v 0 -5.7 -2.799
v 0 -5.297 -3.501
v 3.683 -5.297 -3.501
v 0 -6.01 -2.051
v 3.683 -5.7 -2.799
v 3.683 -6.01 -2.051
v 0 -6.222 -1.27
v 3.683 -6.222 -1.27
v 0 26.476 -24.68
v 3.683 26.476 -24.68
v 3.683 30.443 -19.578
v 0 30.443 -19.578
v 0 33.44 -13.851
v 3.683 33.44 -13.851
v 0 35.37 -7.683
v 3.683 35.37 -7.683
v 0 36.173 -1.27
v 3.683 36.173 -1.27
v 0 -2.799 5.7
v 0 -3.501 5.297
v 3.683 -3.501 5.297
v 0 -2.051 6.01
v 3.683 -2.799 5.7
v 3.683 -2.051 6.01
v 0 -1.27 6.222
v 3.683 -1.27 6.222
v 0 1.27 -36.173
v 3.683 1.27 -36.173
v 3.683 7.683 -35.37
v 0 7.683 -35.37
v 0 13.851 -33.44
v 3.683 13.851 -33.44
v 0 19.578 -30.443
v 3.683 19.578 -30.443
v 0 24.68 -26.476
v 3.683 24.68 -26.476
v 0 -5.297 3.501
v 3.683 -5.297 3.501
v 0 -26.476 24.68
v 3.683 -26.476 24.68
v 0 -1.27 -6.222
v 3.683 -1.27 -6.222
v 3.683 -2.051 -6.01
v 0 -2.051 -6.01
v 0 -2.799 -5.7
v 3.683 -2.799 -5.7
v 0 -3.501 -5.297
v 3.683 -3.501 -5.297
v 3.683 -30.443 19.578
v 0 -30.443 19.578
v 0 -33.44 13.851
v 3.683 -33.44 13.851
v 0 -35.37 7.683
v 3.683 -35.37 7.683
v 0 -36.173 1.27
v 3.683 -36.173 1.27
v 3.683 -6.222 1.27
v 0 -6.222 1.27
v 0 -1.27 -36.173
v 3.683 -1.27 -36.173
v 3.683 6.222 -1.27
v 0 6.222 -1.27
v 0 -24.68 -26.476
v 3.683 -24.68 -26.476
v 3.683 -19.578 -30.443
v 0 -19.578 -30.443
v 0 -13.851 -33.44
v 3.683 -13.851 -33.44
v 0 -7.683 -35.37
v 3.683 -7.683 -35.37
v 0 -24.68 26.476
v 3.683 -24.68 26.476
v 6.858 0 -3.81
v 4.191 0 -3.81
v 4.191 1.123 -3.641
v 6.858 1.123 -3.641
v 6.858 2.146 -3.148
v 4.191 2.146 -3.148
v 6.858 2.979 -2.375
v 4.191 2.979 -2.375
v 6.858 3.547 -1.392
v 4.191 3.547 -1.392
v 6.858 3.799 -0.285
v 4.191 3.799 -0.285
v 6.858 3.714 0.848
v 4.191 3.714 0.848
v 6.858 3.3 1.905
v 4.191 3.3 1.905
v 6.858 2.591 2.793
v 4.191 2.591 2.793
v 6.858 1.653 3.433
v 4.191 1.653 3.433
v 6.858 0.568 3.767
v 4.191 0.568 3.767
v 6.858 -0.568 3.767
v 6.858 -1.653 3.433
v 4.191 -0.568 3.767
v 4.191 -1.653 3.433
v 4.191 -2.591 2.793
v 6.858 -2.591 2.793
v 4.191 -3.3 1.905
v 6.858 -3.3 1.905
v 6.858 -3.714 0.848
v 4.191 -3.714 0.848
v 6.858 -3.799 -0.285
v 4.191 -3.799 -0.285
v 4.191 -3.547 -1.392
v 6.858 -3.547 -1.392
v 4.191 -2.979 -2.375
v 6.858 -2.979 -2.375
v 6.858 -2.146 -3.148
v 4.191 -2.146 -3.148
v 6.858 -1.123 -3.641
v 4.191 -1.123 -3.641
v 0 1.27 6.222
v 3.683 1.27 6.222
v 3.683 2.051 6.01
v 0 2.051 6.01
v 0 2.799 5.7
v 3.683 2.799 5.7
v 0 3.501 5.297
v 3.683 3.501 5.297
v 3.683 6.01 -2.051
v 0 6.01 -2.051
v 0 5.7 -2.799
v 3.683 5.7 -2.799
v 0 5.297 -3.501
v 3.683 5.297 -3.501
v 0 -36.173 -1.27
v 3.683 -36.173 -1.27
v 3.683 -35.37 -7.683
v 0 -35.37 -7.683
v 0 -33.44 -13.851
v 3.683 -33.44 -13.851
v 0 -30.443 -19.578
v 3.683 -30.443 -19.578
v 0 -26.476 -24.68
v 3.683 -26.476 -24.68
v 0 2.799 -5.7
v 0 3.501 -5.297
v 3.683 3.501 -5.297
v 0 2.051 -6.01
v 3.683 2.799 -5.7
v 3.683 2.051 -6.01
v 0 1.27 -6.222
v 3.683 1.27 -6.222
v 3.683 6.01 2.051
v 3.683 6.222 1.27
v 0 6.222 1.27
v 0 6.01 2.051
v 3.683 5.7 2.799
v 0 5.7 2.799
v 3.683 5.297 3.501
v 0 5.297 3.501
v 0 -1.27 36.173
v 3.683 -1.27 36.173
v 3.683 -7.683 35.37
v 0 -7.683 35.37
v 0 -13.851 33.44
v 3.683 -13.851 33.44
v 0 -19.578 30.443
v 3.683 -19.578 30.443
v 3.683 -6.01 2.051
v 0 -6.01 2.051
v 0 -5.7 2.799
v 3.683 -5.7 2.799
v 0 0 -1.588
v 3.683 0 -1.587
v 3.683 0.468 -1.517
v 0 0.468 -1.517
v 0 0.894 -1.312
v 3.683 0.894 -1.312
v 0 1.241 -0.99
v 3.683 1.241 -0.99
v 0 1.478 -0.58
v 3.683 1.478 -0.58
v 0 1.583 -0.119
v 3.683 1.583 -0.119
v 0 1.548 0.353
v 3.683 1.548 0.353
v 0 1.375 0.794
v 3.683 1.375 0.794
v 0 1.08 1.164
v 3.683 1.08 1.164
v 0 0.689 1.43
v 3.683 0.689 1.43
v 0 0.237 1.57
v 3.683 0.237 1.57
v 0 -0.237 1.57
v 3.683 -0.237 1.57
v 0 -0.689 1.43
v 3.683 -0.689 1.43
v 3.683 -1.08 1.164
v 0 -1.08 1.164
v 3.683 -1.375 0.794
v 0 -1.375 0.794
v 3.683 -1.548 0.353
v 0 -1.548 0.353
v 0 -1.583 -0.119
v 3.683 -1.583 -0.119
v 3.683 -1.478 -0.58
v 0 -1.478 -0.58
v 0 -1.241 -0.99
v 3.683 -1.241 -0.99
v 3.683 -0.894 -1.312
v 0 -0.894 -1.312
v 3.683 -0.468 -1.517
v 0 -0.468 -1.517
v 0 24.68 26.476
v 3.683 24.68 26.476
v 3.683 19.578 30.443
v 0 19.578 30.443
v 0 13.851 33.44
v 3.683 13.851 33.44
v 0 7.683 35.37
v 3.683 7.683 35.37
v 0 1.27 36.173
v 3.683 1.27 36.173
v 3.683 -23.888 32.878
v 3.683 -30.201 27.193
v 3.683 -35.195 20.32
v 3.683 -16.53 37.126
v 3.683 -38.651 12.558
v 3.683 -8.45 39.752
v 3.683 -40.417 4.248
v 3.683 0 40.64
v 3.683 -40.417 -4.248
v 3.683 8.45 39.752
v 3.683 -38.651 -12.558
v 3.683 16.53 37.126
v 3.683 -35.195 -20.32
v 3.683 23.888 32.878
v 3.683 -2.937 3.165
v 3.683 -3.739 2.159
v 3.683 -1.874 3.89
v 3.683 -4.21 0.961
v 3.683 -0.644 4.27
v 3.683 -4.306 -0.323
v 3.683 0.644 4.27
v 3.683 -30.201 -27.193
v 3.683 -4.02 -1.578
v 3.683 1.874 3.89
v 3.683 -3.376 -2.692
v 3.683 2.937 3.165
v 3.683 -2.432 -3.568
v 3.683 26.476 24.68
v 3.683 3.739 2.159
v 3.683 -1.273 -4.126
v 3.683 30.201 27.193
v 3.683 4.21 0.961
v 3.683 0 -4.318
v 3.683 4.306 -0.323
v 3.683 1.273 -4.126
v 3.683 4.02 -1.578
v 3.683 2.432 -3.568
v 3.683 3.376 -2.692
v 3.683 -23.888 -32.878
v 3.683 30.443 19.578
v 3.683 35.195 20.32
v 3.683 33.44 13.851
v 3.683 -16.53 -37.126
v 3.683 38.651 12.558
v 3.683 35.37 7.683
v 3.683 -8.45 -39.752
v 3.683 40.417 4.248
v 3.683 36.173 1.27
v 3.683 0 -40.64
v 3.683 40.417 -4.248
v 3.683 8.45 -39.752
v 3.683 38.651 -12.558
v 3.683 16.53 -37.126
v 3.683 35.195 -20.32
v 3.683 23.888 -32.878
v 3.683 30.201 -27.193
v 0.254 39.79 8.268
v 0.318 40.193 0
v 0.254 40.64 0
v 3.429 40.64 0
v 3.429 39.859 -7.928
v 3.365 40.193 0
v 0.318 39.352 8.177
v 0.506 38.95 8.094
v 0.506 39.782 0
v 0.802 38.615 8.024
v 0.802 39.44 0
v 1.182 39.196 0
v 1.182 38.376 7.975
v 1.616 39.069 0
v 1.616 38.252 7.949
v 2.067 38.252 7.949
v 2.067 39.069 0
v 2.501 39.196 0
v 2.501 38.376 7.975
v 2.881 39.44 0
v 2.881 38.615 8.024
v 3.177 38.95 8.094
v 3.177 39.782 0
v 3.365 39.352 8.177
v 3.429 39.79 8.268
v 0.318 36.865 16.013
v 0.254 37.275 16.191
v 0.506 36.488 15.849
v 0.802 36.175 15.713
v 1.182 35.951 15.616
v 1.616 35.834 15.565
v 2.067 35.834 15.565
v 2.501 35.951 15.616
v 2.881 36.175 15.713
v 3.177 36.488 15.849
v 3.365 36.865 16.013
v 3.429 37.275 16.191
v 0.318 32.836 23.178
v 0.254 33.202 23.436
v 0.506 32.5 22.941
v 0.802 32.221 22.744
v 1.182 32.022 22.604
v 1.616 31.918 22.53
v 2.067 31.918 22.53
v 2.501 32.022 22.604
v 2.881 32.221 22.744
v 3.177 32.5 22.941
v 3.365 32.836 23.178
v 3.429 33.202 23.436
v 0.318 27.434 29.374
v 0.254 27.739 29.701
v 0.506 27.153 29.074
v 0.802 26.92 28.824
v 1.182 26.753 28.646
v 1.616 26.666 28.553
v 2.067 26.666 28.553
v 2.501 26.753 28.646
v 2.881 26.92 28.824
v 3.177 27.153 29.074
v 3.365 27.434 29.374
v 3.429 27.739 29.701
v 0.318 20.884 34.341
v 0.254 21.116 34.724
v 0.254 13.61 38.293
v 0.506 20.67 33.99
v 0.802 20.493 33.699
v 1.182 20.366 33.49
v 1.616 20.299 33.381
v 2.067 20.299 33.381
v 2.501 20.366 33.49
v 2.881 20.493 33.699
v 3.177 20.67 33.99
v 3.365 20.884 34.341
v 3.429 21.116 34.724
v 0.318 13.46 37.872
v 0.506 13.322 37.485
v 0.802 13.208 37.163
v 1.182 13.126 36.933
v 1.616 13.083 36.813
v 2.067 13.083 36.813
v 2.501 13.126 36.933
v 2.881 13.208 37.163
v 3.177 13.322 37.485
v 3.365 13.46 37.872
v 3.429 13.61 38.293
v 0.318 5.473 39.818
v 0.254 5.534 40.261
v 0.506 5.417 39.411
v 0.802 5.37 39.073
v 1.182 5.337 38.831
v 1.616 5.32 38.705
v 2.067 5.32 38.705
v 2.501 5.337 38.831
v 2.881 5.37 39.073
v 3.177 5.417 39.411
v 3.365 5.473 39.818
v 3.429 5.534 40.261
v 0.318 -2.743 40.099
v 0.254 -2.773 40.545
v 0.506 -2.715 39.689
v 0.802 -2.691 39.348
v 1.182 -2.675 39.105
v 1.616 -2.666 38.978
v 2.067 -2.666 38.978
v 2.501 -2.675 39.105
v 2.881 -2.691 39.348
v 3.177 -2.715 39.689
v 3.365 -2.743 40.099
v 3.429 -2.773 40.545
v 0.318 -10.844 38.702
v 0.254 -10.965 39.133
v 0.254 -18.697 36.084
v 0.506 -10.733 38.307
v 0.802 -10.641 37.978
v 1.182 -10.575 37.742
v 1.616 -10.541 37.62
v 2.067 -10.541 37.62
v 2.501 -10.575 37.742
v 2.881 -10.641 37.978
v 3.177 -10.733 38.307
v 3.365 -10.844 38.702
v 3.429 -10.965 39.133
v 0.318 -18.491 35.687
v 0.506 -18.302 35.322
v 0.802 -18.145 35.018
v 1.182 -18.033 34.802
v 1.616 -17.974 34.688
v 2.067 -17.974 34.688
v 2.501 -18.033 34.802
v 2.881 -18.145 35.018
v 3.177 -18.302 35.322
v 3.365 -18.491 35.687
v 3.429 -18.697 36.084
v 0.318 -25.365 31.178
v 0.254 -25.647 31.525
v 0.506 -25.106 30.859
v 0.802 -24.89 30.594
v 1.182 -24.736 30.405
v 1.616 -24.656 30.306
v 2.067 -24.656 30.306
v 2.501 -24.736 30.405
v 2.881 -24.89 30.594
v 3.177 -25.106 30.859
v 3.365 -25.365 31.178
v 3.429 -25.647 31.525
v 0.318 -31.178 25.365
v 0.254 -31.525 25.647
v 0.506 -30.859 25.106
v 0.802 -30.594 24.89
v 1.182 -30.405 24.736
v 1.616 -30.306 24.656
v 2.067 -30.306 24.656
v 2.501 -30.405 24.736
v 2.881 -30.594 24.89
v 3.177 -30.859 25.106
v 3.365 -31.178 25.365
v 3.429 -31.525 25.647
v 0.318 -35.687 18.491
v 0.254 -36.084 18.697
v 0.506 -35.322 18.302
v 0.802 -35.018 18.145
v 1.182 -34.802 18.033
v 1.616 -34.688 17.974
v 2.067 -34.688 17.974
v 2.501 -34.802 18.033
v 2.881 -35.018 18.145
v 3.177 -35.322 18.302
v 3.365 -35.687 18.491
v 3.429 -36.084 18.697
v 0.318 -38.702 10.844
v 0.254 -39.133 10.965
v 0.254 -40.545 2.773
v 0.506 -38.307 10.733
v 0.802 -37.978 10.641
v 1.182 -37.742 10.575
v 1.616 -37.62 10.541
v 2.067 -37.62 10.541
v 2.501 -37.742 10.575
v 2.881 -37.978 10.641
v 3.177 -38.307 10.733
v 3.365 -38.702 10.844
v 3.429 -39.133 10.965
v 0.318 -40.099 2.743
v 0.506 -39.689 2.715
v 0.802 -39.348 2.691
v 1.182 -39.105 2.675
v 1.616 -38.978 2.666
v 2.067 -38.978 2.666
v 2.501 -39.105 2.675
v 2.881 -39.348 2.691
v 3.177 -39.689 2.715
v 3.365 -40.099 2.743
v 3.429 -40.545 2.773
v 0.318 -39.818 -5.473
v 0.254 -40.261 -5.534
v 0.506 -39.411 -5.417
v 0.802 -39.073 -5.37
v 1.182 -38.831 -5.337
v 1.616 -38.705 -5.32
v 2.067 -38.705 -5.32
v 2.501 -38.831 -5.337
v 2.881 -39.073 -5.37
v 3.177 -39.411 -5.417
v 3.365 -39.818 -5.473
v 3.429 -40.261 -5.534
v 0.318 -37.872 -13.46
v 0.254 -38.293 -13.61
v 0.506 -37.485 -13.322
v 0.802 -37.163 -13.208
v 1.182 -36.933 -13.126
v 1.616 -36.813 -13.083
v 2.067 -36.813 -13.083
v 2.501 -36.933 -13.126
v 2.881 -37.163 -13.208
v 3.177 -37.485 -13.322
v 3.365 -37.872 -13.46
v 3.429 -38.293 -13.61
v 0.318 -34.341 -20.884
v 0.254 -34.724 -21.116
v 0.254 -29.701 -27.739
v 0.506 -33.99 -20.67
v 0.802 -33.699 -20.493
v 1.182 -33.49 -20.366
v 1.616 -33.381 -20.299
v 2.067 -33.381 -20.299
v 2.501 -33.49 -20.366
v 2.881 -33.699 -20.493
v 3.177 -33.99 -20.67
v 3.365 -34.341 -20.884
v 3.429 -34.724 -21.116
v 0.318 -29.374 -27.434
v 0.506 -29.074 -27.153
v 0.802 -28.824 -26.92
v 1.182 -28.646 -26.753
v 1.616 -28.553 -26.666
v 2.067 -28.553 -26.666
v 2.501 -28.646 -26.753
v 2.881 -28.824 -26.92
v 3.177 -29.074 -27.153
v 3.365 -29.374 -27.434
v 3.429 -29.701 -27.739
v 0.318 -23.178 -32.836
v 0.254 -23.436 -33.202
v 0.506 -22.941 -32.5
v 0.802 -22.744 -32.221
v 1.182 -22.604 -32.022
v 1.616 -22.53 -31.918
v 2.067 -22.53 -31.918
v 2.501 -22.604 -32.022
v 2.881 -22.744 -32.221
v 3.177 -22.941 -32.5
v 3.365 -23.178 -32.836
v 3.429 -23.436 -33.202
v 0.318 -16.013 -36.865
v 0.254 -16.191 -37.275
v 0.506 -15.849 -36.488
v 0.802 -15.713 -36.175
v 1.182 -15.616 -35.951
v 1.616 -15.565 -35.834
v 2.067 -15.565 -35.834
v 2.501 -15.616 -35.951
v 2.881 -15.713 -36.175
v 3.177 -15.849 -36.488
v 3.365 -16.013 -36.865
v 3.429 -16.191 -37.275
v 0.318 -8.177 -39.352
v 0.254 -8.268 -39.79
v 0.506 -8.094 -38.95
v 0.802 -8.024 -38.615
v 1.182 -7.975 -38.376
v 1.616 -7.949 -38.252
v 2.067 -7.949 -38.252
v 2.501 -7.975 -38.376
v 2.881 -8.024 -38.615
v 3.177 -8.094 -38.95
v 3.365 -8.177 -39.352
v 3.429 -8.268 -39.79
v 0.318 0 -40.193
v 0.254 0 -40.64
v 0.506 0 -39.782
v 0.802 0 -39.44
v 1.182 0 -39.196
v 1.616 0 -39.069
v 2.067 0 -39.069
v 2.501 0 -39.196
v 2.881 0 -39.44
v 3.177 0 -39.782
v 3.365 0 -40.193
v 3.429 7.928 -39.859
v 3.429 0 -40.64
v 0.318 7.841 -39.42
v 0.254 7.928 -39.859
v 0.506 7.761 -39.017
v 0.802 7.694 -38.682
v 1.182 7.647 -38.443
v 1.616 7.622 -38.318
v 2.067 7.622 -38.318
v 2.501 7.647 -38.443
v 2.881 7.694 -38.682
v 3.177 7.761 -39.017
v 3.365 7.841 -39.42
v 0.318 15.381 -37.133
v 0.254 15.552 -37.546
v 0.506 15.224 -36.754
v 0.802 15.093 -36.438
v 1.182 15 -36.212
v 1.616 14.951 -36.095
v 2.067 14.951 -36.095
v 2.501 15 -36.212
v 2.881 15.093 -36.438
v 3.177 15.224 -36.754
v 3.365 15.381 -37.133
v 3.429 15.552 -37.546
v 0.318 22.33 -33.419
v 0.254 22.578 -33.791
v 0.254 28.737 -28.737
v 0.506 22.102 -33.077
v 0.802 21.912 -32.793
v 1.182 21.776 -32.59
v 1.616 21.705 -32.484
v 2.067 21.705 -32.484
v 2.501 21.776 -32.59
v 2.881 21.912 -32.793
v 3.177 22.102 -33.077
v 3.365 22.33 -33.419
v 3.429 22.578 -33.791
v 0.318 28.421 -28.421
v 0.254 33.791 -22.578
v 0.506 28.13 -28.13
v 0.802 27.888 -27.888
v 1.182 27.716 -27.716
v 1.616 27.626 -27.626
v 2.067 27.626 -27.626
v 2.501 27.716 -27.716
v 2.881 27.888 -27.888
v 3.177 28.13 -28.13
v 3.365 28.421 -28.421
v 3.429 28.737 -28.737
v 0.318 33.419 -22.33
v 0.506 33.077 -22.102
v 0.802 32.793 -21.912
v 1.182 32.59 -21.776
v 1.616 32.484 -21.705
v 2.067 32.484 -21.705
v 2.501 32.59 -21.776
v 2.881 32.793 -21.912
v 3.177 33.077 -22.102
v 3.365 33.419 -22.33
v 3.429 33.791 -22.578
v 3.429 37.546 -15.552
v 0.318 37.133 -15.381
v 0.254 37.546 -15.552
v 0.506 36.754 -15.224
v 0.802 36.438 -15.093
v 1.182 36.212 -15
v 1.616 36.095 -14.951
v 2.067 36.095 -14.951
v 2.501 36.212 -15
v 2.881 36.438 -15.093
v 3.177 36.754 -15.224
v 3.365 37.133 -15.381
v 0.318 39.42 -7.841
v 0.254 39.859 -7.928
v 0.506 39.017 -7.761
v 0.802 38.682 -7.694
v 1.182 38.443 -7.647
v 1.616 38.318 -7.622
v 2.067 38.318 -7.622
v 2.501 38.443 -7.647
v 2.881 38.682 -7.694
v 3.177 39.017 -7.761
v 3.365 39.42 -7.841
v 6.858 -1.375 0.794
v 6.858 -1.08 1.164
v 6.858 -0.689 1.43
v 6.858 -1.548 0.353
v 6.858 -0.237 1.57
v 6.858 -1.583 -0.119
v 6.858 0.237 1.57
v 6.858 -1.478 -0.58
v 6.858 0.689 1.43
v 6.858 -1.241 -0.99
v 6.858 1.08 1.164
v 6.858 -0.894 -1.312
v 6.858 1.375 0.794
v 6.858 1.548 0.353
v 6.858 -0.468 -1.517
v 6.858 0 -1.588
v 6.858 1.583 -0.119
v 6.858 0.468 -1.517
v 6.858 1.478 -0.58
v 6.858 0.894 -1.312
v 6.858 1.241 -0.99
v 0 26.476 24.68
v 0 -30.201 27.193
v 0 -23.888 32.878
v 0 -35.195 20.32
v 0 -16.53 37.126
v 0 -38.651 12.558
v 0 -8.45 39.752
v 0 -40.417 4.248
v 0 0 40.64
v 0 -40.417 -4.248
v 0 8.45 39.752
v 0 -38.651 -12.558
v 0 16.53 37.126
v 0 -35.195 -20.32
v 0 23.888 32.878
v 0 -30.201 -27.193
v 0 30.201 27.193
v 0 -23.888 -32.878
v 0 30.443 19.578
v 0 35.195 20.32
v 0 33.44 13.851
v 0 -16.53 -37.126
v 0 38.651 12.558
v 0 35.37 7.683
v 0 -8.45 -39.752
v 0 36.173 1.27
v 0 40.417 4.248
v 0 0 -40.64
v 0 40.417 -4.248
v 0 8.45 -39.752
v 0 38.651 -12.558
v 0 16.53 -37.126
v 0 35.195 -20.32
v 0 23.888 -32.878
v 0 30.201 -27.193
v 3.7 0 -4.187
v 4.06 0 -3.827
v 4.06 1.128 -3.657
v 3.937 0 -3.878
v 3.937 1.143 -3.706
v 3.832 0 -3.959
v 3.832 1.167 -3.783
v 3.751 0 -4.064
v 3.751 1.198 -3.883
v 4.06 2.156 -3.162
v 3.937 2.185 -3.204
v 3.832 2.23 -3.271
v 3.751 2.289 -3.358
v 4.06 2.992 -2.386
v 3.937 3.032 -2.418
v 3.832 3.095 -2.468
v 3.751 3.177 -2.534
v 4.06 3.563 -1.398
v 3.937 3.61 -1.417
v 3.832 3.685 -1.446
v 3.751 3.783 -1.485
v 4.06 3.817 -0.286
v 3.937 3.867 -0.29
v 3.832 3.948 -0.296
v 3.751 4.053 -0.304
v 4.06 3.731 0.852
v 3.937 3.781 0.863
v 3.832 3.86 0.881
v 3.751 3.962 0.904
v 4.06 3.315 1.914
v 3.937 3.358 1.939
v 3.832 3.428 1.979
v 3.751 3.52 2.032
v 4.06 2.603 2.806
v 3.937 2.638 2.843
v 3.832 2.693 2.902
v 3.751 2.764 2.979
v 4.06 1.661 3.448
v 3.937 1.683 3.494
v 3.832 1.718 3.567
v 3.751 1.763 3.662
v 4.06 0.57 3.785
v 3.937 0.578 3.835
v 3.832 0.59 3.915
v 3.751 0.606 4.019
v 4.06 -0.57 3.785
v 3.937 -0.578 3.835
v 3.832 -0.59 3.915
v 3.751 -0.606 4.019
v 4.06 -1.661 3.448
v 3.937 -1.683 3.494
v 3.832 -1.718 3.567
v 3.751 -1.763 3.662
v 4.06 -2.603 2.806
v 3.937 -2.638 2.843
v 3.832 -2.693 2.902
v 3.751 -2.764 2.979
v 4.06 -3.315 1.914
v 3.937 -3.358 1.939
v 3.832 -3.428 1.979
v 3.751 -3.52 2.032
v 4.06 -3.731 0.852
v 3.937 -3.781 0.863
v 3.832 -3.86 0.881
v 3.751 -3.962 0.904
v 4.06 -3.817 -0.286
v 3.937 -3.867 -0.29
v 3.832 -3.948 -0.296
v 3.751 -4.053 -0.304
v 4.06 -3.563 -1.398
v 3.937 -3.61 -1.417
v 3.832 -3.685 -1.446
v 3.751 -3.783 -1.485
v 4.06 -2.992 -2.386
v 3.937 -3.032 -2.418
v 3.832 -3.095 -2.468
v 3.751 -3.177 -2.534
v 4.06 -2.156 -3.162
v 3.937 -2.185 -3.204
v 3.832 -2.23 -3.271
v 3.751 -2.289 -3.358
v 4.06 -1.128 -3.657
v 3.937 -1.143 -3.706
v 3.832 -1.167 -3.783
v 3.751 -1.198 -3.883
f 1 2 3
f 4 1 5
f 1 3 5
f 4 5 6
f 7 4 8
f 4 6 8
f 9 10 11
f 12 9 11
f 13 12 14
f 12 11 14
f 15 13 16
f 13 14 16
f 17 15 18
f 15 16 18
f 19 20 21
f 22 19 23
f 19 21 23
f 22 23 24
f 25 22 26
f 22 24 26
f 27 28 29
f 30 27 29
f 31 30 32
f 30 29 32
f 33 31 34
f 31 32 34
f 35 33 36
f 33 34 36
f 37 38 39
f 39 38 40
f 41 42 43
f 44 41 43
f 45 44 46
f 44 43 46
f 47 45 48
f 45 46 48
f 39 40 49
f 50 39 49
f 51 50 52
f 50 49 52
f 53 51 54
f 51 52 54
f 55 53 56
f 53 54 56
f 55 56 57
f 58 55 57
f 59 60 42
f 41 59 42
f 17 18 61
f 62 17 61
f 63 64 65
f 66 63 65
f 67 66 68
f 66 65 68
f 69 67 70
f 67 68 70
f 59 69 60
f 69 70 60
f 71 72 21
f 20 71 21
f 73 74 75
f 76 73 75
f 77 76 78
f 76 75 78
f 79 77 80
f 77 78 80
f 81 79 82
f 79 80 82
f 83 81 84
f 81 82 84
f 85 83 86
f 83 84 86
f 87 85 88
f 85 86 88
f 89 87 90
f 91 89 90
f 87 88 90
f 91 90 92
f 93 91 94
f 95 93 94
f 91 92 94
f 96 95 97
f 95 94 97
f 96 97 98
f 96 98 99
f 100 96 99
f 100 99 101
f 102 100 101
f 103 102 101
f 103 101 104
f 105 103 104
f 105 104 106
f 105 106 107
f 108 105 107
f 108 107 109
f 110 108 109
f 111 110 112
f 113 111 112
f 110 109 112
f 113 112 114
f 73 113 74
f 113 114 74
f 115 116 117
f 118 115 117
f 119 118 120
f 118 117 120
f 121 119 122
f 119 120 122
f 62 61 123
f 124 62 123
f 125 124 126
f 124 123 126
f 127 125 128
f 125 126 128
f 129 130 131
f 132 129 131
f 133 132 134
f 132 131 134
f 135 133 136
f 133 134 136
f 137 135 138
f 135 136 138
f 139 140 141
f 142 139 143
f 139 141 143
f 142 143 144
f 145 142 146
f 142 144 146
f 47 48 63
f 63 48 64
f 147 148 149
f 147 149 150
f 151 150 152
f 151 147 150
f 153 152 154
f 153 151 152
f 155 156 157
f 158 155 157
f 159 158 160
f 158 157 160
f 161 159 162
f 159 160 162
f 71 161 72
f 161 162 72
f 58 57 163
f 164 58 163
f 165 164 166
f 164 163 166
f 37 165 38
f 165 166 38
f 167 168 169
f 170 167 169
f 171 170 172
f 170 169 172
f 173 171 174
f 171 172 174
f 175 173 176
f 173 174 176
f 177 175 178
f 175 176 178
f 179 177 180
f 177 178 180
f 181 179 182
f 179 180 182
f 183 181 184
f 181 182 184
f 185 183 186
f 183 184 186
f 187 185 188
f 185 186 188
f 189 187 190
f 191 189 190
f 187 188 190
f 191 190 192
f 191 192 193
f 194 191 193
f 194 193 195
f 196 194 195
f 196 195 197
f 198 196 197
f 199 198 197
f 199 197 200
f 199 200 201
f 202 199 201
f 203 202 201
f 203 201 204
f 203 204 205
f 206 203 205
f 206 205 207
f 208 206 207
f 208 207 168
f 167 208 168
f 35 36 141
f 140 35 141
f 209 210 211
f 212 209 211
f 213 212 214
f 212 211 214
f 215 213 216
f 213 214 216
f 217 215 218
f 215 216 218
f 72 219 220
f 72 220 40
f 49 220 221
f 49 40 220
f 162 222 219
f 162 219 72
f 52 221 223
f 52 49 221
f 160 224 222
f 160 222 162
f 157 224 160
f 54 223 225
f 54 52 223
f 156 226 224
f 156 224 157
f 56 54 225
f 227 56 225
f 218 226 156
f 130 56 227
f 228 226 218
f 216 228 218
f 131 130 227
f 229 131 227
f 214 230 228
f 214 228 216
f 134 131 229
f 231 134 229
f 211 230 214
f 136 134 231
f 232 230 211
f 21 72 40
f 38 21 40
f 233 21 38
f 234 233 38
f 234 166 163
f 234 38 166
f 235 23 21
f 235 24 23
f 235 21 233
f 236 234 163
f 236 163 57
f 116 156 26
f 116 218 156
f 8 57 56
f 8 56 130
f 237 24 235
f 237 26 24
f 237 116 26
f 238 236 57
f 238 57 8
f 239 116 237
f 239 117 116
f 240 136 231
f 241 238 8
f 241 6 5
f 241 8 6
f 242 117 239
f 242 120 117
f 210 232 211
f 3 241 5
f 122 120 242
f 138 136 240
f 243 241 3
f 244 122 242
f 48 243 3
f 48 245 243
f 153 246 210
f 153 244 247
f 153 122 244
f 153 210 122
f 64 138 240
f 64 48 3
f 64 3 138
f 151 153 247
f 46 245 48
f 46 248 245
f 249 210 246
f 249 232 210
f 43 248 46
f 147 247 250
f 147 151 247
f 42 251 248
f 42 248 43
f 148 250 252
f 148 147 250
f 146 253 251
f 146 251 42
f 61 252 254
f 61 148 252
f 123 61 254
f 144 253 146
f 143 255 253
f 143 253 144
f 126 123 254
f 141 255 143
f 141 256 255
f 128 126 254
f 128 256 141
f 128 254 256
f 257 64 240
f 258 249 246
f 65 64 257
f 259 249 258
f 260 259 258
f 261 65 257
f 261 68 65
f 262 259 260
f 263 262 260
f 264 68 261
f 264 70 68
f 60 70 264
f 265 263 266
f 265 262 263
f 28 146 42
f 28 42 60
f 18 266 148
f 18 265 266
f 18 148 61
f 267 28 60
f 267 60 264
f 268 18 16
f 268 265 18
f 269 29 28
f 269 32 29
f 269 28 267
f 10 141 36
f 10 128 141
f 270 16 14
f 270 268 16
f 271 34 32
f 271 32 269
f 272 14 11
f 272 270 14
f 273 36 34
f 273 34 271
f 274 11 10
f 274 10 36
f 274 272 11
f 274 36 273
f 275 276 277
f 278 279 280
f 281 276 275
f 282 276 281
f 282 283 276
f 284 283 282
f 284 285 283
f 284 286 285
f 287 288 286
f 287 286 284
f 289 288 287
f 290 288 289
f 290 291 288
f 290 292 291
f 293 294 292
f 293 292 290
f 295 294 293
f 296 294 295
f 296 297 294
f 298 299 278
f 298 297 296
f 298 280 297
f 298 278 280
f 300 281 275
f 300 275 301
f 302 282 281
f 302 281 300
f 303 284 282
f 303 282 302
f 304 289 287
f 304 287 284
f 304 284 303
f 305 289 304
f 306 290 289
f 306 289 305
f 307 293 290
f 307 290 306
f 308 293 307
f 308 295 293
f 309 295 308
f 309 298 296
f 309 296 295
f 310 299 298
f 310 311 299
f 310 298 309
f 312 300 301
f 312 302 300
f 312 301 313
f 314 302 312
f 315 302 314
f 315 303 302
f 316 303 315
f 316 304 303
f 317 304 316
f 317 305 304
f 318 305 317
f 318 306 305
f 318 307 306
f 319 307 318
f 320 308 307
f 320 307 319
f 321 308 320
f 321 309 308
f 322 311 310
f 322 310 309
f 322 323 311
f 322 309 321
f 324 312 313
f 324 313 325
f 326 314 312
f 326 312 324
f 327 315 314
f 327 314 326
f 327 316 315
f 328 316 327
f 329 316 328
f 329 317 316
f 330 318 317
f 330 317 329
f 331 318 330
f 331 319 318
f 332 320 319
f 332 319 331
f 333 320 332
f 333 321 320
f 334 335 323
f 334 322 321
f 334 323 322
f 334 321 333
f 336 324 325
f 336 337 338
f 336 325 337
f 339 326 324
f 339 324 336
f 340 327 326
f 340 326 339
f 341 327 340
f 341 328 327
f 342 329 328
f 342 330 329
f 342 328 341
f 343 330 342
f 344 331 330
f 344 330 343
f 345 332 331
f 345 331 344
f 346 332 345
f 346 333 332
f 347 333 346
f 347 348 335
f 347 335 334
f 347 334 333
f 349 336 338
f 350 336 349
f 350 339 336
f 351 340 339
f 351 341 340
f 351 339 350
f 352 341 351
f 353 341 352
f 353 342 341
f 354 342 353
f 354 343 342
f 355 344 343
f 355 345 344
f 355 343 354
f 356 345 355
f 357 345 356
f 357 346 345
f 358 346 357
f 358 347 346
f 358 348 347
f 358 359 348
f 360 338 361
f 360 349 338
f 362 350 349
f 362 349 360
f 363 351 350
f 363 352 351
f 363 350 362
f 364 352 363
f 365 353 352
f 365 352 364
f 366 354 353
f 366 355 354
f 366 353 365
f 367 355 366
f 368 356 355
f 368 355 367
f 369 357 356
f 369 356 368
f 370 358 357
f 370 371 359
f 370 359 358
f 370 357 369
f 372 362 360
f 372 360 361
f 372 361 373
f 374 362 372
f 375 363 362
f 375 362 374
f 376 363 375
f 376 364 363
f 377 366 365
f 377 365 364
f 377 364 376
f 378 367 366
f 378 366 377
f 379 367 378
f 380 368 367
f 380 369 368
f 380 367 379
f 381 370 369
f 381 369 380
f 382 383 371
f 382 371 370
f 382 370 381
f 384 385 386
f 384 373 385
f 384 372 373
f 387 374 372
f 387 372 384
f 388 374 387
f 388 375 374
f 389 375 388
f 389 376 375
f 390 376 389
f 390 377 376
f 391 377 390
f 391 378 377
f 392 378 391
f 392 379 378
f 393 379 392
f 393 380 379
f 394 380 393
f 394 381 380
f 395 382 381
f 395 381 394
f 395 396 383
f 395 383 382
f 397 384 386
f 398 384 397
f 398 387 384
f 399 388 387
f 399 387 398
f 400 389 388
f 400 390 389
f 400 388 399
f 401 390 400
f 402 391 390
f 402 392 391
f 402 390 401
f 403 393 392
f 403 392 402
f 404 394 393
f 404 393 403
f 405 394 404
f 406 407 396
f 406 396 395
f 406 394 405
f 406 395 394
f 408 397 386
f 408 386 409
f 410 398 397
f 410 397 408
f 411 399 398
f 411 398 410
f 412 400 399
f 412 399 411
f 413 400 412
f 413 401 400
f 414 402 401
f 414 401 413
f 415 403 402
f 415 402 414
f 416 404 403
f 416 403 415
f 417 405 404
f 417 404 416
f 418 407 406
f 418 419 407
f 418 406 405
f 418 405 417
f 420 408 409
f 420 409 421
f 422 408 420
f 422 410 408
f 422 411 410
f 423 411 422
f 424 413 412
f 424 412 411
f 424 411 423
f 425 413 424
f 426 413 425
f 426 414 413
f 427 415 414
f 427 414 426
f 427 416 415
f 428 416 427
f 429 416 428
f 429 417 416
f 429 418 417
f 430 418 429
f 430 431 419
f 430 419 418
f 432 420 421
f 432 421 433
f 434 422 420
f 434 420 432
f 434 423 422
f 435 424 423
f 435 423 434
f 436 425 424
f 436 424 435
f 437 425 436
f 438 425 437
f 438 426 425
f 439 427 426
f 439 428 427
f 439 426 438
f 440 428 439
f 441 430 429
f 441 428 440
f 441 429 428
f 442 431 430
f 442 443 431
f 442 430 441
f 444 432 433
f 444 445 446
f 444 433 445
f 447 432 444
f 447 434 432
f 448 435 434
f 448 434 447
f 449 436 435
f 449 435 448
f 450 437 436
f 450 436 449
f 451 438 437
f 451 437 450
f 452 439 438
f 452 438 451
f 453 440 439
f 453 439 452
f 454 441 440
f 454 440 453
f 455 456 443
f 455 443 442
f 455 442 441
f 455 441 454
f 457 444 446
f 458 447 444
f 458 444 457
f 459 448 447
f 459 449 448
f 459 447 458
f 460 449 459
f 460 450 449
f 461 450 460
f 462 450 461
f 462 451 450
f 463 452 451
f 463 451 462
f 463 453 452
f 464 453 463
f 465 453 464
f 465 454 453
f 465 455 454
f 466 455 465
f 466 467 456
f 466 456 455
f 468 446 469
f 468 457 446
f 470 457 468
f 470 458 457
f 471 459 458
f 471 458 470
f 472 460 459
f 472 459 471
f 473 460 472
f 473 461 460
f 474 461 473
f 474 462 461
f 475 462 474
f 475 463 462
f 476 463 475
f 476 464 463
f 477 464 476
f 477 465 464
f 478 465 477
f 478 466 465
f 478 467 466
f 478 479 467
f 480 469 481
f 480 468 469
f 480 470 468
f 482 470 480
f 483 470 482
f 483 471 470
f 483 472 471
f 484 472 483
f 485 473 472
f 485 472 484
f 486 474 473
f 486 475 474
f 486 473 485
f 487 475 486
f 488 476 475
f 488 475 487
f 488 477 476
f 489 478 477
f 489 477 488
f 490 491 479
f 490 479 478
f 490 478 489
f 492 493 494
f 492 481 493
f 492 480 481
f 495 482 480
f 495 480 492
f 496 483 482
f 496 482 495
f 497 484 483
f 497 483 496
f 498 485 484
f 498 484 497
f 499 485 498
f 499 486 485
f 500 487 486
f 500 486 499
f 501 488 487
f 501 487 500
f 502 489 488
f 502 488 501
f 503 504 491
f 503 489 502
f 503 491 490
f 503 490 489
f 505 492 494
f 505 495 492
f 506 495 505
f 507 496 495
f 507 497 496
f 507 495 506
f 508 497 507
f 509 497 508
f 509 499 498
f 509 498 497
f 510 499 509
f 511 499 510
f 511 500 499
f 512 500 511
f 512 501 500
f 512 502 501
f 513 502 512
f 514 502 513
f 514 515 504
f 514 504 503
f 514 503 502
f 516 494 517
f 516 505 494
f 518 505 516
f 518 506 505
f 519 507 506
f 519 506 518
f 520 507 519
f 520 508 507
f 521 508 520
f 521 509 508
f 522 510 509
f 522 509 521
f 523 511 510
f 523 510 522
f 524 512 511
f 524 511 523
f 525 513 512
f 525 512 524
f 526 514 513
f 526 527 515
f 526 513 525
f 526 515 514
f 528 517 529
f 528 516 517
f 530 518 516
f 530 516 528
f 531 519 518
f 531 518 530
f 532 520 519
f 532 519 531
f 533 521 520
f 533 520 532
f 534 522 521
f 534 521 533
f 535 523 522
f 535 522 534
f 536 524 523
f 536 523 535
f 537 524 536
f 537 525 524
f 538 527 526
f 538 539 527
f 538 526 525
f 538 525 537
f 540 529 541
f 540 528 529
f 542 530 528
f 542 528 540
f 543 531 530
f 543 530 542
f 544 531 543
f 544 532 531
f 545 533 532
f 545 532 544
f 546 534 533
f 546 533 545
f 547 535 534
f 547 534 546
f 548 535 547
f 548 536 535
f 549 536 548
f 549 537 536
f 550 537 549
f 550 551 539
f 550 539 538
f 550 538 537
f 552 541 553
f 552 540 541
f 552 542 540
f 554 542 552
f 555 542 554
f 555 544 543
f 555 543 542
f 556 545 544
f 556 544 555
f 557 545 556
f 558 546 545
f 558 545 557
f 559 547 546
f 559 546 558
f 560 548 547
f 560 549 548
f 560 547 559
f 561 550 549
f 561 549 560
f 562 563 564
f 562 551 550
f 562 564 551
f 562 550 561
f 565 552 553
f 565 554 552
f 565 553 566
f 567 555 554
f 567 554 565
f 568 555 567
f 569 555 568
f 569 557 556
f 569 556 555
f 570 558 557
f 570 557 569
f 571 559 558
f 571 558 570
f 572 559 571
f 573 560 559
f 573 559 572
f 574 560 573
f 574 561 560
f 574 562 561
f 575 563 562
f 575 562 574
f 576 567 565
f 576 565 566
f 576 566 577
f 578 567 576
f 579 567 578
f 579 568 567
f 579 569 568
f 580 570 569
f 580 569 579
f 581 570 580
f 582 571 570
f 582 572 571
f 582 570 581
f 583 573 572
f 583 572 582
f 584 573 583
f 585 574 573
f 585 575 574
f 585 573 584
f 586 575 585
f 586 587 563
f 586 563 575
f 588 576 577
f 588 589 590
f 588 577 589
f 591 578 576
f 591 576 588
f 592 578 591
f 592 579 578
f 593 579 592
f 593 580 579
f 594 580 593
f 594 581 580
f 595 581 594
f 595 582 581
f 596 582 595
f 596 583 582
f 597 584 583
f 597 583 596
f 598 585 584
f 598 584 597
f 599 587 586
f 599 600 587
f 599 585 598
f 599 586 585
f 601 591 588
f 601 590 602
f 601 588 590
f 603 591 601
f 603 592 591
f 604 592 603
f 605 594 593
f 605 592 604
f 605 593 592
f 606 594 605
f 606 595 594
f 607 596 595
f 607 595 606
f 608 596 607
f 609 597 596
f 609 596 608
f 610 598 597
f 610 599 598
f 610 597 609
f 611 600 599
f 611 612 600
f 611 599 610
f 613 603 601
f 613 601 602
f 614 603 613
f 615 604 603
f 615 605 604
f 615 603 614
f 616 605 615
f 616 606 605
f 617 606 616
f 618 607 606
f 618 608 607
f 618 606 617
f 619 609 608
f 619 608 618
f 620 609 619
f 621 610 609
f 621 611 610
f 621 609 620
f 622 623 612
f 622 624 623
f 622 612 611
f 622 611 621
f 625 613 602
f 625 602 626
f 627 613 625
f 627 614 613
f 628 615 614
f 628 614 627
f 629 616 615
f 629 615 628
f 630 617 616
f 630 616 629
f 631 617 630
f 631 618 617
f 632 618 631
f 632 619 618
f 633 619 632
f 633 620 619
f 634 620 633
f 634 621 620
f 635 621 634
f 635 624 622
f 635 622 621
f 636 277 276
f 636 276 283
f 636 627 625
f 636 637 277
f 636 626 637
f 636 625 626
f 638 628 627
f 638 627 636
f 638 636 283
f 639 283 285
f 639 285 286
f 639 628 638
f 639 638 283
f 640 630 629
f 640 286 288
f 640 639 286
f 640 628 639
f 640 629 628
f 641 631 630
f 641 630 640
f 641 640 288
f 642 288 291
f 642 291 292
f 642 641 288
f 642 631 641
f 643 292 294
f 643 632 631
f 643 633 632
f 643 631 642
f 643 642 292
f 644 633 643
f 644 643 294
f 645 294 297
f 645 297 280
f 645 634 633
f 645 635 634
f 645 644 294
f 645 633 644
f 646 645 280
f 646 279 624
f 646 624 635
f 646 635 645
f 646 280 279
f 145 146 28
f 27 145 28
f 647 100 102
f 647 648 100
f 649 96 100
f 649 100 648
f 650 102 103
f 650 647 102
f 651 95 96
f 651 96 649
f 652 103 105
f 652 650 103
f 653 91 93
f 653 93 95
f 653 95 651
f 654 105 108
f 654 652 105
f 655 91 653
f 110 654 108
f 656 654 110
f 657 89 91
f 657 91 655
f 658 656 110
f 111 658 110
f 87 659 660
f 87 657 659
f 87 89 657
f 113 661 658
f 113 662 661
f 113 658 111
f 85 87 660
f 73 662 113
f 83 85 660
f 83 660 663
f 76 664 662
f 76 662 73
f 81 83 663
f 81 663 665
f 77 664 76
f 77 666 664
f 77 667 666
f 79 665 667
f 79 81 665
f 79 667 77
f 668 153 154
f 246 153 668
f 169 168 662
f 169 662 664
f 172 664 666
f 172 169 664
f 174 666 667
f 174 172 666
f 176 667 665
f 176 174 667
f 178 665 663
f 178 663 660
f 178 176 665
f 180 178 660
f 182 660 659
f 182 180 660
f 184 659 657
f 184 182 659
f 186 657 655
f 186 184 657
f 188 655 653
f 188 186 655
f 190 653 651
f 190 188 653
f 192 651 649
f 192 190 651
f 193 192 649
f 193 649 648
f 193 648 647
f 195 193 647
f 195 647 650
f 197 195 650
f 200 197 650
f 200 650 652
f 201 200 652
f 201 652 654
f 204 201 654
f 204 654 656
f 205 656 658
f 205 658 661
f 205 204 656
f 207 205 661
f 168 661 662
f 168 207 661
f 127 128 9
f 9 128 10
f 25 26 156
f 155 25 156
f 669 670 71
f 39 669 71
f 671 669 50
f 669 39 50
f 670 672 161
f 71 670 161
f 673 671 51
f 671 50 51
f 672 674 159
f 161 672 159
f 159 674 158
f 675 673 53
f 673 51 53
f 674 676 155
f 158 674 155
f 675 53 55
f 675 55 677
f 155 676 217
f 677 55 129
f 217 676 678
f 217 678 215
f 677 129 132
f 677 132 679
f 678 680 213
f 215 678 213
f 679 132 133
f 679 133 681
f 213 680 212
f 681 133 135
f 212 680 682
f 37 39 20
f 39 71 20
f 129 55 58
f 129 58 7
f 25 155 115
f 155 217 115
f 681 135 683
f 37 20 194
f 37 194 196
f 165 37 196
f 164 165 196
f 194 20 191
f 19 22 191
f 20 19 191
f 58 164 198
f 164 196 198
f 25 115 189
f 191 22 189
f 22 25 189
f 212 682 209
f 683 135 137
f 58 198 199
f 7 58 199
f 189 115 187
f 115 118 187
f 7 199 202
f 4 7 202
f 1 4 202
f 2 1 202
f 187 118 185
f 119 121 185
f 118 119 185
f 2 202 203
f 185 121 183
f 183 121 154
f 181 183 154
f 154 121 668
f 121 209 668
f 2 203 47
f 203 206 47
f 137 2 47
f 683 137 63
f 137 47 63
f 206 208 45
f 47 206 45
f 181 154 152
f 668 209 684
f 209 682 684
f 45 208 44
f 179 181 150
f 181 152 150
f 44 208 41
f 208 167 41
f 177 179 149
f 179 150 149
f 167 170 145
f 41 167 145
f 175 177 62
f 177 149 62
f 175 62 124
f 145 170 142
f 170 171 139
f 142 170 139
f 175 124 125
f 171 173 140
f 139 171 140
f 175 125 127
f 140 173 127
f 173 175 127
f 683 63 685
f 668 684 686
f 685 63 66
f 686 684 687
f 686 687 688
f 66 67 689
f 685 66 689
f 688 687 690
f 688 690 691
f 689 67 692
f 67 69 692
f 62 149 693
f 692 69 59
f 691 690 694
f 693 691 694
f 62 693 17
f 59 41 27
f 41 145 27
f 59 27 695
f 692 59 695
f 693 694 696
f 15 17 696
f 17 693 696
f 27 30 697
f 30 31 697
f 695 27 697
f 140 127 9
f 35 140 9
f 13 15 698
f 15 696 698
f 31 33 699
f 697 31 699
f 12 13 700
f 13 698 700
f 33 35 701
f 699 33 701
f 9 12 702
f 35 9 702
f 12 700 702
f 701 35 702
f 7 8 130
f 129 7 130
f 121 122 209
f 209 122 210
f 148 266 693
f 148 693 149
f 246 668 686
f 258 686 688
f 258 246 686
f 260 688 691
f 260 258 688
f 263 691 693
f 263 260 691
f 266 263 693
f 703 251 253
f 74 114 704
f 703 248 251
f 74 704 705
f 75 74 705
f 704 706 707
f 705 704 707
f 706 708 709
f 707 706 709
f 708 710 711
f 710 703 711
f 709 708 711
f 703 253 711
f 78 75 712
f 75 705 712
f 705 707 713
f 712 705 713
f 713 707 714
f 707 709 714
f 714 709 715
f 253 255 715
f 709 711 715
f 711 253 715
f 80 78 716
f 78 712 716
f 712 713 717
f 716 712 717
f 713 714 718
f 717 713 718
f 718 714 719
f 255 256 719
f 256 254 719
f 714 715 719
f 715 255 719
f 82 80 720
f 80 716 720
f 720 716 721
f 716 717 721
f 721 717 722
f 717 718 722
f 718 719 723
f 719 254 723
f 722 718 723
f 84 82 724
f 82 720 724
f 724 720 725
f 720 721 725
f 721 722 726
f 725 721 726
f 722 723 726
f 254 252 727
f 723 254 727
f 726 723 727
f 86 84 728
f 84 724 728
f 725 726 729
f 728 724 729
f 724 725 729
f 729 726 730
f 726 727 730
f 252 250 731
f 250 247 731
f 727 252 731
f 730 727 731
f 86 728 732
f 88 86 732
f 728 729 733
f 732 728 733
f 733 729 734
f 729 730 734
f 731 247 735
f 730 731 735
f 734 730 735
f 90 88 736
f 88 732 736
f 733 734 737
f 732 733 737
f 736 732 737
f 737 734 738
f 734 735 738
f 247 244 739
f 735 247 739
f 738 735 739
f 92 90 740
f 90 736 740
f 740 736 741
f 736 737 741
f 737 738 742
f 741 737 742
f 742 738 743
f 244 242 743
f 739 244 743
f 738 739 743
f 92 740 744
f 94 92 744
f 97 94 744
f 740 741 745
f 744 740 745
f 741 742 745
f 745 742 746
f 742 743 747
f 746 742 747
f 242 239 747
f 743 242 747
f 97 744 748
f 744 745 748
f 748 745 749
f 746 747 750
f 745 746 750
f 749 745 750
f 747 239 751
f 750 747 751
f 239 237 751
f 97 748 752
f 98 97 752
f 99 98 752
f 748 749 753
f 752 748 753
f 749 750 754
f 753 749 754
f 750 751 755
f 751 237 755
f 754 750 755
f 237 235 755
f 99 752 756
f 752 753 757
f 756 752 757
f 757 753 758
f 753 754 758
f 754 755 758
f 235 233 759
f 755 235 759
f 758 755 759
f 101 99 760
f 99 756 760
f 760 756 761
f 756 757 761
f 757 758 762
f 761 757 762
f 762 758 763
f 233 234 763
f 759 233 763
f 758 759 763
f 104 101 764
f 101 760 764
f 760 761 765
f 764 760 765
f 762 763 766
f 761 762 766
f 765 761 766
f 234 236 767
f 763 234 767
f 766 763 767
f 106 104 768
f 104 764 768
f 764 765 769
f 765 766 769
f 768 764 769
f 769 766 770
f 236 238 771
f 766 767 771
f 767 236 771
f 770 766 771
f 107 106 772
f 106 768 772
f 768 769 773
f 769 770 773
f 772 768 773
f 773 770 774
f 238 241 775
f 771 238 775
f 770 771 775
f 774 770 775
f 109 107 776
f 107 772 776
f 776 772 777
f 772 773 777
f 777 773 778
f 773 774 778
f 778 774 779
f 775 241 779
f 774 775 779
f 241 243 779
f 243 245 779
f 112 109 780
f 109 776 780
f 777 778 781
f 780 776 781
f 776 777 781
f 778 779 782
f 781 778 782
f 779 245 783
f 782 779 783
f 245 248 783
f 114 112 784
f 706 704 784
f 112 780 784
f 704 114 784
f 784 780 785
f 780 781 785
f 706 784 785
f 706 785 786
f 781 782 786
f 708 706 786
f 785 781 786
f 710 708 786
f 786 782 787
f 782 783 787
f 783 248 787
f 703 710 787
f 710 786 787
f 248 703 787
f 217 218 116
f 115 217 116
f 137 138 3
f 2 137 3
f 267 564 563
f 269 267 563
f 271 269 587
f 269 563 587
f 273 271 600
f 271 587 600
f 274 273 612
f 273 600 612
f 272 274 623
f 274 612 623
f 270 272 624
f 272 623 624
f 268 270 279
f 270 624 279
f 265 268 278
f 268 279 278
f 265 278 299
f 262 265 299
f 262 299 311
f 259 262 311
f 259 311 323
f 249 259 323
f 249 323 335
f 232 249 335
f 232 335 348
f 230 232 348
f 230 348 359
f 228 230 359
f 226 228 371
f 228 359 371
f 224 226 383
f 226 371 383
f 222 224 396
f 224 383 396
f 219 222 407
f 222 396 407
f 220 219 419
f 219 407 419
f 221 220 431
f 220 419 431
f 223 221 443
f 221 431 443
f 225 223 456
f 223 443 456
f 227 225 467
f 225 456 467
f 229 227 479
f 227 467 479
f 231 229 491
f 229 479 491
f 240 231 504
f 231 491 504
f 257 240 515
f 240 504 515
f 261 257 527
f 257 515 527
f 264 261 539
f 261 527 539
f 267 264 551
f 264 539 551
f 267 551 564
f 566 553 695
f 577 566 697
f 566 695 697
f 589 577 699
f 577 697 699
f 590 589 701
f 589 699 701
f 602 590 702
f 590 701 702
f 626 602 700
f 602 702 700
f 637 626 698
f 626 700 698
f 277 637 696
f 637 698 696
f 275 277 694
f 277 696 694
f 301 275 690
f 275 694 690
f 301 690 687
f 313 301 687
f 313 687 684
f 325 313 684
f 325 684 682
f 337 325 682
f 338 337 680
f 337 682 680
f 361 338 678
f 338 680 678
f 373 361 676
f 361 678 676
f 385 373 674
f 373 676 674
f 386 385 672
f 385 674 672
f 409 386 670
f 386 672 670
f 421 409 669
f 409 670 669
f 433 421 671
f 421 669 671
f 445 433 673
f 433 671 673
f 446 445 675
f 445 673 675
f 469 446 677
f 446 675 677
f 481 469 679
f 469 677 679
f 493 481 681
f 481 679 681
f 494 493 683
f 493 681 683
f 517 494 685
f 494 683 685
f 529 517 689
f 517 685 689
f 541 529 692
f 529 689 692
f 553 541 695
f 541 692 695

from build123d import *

# Parameters (mm, degrees)
SKETCH1_R           = 40.64
BOSS_EXTRUDE1_DEPTH = 3.683
SKETCH10_R          = 1.5875
CUT_EXTRUDE3_DEPTH  = 4.683
SKETCH12_R          = 1.5875
CUT_EXTRUDE4_DEPTH  = 4.683
SKETCH13_R          = 3.81
SKETCH13_R_2        = 1.5875
BOSS_EXTRUDE2_DEPTH = 3.175
FILLET1_R           = 0.508


with BuildPart() as part:
    # Sketch1 → Boss-Extrude1 (new body)
    with BuildSketch(Plane(origin=(0, 0, 0), x_dir=(0, 0, -1), z_dir=(1, 0, 0))):
        Circle(SKETCH1_R)
    extrude(amount=BOSS_EXTRUDE1_DEPTH)

    # Sketch10 → Cut-Revolve1 (revolve, cut)
    with BuildSketch(Plane.XY):
        with Locations((1.8415, 40.64)):
            Circle(SKETCH10_R)
    revolve(axis=Axis((-1.01619145, 0, 0), (1, 0, 0)), mode=Mode.SUBTRACT)

    # Sketch11 → Cut-Extrude3 (cut, through all)
    with BuildSketch(Plane(origin=(3.683, 0, 0), x_dir=(0, 0, -1), z_dir=(1, 0, 0))):
        with BuildLine():
            Line((-1.27, 36.172712436), (-1.27, 6.221703947))
            ThreePointArc((-1.27, 6.221703947), (-2.430039796, 5.866635031), (-3.501383439, 5.297434663))
            Line((-3.501383439, 5.297434663), (-24.679944646, 26.47599587))
            ThreePointArc((-24.679944646, 26.47599587), (-13.851226834, 33.439819679), (-1.27, 36.172712436))
        make_face()
        with BuildLine():
            Line((1.27, 36.172712436), (1.27, 6.221703947))
            ThreePointArc((1.27, 6.221703947), (2.430039796, 5.866635031), (3.501383439, 5.297434663))
            Line((3.501383439, 5.297434663), (24.679944646, 26.47599587))
            ThreePointArc((24.679944646, 26.47599587), (13.851226834, 33.439819679), (1.27, 36.172712436))
        make_face()
        with BuildLine():
            Line((26.47599587, 24.679944646), (5.297434663, 3.501383439))
            ThreePointArc((5.297434663, 3.501383439), (5.866635031, 2.430039796), (6.221703947, 1.27))
            Line((6.221703947, 1.27), (36.172712436, 1.27))
            ThreePointArc((36.172712436, 1.27), (33.439819679, 13.851226834), (26.47599587, 24.679944646))
        make_face()
        with BuildLine():
            Line((36.172712436, -1.27), (6.221703947, -1.27))
            ThreePointArc((6.221703947, -1.27), (5.866635031, -2.430039796), (5.297434663, -3.501383439))
            Line((5.297434663, -3.501383439), (26.47599587, -24.679944646))
            ThreePointArc((26.47599587, -24.679944646), (33.439819679, -13.851226834), (36.172712436, -1.27))
        make_face()
        with BuildLine():
            Line((24.679944646, -26.47599587), (3.501383439, -5.297434663))
            ThreePointArc((3.501383439, -5.297434663), (2.430039796, -5.866635031), (1.27, -6.221703947))
            Line((1.27, -6.221703947), (1.27, -36.172712436))
            ThreePointArc((1.27, -36.172712436), (13.851226834, -33.439819679), (24.679944646, -26.47599587))
        make_face()
        with BuildLine():
            Line((-1.27, -36.172712436), (-1.27, -6.221703947))
            ThreePointArc((-1.27, -6.221703947), (-2.430039796, -5.866635031), (-3.501383439, -5.297434663))
            Line((-3.501383439, -5.297434663), (-24.679944646, -26.47599587))
            ThreePointArc((-24.679944646, -26.47599587), (-13.851226834, -33.439819679), (-1.27, -36.172712436))
        make_face()
        with BuildLine():
            Line((-26.47599587, -24.679944646), (-5.297434663, -3.501383439))
            ThreePointArc((-5.297434663, -3.501383439), (-5.866635031, -2.430039796), (-6.221703947, -1.27))
            Line((-6.221703947, -1.27), (-36.172712436, -1.27))
            ThreePointArc((-36.172712436, -1.27), (-33.439819679, -13.851226834), (-26.47599587, -24.679944646))
        make_face()
        with BuildLine():
            Line((-36.172712436, 1.27), (-6.221703947, 1.27))
            ThreePointArc((-6.221703947, 1.27), (-5.866635031, 2.430039796), (-5.297434663, 3.501383439))
            Line((-5.297434663, 3.501383439), (-26.47599587, 24.679944646))
            ThreePointArc((-26.47599587, 24.679944646), (-33.439819679, 13.851226834), (-36.172712436, 1.27))
        make_face()
    extrude(amount=-CUT_EXTRUDE3_DEPTH, mode=Mode.SUBTRACT)

    # Sketch12 → Cut-Extrude4 (cut, through all)
    with BuildSketch(Plane(origin=(3.683, 0, 0), x_dir=(0, 0, -1), z_dir=(1, 0, 0))):
        Circle(SKETCH12_R)
    extrude(amount=-CUT_EXTRUDE4_DEPTH, mode=Mode.SUBTRACT)

    # Sketch13 → Boss-Extrude2 (add)
    with BuildSketch(Plane(origin=(3.683, 0, 0), x_dir=(0, 0, -1), z_dir=(1, 0, 0))):
        Circle(SKETCH13_R)
        Circle(SKETCH13_R_2, mode=Mode.SUBTRACT)
    extrude(amount=BOSS_EXTRUDE2_DEPTH)

    # Fillet1
    fillet1_edges = [part.edges().sort_by_distance(p)[0] for p in [
        (3.683, 0, 3.81),
    ]]
    fillet(fillet1_edges, radius=FILLET1_R)


solid = part.part
